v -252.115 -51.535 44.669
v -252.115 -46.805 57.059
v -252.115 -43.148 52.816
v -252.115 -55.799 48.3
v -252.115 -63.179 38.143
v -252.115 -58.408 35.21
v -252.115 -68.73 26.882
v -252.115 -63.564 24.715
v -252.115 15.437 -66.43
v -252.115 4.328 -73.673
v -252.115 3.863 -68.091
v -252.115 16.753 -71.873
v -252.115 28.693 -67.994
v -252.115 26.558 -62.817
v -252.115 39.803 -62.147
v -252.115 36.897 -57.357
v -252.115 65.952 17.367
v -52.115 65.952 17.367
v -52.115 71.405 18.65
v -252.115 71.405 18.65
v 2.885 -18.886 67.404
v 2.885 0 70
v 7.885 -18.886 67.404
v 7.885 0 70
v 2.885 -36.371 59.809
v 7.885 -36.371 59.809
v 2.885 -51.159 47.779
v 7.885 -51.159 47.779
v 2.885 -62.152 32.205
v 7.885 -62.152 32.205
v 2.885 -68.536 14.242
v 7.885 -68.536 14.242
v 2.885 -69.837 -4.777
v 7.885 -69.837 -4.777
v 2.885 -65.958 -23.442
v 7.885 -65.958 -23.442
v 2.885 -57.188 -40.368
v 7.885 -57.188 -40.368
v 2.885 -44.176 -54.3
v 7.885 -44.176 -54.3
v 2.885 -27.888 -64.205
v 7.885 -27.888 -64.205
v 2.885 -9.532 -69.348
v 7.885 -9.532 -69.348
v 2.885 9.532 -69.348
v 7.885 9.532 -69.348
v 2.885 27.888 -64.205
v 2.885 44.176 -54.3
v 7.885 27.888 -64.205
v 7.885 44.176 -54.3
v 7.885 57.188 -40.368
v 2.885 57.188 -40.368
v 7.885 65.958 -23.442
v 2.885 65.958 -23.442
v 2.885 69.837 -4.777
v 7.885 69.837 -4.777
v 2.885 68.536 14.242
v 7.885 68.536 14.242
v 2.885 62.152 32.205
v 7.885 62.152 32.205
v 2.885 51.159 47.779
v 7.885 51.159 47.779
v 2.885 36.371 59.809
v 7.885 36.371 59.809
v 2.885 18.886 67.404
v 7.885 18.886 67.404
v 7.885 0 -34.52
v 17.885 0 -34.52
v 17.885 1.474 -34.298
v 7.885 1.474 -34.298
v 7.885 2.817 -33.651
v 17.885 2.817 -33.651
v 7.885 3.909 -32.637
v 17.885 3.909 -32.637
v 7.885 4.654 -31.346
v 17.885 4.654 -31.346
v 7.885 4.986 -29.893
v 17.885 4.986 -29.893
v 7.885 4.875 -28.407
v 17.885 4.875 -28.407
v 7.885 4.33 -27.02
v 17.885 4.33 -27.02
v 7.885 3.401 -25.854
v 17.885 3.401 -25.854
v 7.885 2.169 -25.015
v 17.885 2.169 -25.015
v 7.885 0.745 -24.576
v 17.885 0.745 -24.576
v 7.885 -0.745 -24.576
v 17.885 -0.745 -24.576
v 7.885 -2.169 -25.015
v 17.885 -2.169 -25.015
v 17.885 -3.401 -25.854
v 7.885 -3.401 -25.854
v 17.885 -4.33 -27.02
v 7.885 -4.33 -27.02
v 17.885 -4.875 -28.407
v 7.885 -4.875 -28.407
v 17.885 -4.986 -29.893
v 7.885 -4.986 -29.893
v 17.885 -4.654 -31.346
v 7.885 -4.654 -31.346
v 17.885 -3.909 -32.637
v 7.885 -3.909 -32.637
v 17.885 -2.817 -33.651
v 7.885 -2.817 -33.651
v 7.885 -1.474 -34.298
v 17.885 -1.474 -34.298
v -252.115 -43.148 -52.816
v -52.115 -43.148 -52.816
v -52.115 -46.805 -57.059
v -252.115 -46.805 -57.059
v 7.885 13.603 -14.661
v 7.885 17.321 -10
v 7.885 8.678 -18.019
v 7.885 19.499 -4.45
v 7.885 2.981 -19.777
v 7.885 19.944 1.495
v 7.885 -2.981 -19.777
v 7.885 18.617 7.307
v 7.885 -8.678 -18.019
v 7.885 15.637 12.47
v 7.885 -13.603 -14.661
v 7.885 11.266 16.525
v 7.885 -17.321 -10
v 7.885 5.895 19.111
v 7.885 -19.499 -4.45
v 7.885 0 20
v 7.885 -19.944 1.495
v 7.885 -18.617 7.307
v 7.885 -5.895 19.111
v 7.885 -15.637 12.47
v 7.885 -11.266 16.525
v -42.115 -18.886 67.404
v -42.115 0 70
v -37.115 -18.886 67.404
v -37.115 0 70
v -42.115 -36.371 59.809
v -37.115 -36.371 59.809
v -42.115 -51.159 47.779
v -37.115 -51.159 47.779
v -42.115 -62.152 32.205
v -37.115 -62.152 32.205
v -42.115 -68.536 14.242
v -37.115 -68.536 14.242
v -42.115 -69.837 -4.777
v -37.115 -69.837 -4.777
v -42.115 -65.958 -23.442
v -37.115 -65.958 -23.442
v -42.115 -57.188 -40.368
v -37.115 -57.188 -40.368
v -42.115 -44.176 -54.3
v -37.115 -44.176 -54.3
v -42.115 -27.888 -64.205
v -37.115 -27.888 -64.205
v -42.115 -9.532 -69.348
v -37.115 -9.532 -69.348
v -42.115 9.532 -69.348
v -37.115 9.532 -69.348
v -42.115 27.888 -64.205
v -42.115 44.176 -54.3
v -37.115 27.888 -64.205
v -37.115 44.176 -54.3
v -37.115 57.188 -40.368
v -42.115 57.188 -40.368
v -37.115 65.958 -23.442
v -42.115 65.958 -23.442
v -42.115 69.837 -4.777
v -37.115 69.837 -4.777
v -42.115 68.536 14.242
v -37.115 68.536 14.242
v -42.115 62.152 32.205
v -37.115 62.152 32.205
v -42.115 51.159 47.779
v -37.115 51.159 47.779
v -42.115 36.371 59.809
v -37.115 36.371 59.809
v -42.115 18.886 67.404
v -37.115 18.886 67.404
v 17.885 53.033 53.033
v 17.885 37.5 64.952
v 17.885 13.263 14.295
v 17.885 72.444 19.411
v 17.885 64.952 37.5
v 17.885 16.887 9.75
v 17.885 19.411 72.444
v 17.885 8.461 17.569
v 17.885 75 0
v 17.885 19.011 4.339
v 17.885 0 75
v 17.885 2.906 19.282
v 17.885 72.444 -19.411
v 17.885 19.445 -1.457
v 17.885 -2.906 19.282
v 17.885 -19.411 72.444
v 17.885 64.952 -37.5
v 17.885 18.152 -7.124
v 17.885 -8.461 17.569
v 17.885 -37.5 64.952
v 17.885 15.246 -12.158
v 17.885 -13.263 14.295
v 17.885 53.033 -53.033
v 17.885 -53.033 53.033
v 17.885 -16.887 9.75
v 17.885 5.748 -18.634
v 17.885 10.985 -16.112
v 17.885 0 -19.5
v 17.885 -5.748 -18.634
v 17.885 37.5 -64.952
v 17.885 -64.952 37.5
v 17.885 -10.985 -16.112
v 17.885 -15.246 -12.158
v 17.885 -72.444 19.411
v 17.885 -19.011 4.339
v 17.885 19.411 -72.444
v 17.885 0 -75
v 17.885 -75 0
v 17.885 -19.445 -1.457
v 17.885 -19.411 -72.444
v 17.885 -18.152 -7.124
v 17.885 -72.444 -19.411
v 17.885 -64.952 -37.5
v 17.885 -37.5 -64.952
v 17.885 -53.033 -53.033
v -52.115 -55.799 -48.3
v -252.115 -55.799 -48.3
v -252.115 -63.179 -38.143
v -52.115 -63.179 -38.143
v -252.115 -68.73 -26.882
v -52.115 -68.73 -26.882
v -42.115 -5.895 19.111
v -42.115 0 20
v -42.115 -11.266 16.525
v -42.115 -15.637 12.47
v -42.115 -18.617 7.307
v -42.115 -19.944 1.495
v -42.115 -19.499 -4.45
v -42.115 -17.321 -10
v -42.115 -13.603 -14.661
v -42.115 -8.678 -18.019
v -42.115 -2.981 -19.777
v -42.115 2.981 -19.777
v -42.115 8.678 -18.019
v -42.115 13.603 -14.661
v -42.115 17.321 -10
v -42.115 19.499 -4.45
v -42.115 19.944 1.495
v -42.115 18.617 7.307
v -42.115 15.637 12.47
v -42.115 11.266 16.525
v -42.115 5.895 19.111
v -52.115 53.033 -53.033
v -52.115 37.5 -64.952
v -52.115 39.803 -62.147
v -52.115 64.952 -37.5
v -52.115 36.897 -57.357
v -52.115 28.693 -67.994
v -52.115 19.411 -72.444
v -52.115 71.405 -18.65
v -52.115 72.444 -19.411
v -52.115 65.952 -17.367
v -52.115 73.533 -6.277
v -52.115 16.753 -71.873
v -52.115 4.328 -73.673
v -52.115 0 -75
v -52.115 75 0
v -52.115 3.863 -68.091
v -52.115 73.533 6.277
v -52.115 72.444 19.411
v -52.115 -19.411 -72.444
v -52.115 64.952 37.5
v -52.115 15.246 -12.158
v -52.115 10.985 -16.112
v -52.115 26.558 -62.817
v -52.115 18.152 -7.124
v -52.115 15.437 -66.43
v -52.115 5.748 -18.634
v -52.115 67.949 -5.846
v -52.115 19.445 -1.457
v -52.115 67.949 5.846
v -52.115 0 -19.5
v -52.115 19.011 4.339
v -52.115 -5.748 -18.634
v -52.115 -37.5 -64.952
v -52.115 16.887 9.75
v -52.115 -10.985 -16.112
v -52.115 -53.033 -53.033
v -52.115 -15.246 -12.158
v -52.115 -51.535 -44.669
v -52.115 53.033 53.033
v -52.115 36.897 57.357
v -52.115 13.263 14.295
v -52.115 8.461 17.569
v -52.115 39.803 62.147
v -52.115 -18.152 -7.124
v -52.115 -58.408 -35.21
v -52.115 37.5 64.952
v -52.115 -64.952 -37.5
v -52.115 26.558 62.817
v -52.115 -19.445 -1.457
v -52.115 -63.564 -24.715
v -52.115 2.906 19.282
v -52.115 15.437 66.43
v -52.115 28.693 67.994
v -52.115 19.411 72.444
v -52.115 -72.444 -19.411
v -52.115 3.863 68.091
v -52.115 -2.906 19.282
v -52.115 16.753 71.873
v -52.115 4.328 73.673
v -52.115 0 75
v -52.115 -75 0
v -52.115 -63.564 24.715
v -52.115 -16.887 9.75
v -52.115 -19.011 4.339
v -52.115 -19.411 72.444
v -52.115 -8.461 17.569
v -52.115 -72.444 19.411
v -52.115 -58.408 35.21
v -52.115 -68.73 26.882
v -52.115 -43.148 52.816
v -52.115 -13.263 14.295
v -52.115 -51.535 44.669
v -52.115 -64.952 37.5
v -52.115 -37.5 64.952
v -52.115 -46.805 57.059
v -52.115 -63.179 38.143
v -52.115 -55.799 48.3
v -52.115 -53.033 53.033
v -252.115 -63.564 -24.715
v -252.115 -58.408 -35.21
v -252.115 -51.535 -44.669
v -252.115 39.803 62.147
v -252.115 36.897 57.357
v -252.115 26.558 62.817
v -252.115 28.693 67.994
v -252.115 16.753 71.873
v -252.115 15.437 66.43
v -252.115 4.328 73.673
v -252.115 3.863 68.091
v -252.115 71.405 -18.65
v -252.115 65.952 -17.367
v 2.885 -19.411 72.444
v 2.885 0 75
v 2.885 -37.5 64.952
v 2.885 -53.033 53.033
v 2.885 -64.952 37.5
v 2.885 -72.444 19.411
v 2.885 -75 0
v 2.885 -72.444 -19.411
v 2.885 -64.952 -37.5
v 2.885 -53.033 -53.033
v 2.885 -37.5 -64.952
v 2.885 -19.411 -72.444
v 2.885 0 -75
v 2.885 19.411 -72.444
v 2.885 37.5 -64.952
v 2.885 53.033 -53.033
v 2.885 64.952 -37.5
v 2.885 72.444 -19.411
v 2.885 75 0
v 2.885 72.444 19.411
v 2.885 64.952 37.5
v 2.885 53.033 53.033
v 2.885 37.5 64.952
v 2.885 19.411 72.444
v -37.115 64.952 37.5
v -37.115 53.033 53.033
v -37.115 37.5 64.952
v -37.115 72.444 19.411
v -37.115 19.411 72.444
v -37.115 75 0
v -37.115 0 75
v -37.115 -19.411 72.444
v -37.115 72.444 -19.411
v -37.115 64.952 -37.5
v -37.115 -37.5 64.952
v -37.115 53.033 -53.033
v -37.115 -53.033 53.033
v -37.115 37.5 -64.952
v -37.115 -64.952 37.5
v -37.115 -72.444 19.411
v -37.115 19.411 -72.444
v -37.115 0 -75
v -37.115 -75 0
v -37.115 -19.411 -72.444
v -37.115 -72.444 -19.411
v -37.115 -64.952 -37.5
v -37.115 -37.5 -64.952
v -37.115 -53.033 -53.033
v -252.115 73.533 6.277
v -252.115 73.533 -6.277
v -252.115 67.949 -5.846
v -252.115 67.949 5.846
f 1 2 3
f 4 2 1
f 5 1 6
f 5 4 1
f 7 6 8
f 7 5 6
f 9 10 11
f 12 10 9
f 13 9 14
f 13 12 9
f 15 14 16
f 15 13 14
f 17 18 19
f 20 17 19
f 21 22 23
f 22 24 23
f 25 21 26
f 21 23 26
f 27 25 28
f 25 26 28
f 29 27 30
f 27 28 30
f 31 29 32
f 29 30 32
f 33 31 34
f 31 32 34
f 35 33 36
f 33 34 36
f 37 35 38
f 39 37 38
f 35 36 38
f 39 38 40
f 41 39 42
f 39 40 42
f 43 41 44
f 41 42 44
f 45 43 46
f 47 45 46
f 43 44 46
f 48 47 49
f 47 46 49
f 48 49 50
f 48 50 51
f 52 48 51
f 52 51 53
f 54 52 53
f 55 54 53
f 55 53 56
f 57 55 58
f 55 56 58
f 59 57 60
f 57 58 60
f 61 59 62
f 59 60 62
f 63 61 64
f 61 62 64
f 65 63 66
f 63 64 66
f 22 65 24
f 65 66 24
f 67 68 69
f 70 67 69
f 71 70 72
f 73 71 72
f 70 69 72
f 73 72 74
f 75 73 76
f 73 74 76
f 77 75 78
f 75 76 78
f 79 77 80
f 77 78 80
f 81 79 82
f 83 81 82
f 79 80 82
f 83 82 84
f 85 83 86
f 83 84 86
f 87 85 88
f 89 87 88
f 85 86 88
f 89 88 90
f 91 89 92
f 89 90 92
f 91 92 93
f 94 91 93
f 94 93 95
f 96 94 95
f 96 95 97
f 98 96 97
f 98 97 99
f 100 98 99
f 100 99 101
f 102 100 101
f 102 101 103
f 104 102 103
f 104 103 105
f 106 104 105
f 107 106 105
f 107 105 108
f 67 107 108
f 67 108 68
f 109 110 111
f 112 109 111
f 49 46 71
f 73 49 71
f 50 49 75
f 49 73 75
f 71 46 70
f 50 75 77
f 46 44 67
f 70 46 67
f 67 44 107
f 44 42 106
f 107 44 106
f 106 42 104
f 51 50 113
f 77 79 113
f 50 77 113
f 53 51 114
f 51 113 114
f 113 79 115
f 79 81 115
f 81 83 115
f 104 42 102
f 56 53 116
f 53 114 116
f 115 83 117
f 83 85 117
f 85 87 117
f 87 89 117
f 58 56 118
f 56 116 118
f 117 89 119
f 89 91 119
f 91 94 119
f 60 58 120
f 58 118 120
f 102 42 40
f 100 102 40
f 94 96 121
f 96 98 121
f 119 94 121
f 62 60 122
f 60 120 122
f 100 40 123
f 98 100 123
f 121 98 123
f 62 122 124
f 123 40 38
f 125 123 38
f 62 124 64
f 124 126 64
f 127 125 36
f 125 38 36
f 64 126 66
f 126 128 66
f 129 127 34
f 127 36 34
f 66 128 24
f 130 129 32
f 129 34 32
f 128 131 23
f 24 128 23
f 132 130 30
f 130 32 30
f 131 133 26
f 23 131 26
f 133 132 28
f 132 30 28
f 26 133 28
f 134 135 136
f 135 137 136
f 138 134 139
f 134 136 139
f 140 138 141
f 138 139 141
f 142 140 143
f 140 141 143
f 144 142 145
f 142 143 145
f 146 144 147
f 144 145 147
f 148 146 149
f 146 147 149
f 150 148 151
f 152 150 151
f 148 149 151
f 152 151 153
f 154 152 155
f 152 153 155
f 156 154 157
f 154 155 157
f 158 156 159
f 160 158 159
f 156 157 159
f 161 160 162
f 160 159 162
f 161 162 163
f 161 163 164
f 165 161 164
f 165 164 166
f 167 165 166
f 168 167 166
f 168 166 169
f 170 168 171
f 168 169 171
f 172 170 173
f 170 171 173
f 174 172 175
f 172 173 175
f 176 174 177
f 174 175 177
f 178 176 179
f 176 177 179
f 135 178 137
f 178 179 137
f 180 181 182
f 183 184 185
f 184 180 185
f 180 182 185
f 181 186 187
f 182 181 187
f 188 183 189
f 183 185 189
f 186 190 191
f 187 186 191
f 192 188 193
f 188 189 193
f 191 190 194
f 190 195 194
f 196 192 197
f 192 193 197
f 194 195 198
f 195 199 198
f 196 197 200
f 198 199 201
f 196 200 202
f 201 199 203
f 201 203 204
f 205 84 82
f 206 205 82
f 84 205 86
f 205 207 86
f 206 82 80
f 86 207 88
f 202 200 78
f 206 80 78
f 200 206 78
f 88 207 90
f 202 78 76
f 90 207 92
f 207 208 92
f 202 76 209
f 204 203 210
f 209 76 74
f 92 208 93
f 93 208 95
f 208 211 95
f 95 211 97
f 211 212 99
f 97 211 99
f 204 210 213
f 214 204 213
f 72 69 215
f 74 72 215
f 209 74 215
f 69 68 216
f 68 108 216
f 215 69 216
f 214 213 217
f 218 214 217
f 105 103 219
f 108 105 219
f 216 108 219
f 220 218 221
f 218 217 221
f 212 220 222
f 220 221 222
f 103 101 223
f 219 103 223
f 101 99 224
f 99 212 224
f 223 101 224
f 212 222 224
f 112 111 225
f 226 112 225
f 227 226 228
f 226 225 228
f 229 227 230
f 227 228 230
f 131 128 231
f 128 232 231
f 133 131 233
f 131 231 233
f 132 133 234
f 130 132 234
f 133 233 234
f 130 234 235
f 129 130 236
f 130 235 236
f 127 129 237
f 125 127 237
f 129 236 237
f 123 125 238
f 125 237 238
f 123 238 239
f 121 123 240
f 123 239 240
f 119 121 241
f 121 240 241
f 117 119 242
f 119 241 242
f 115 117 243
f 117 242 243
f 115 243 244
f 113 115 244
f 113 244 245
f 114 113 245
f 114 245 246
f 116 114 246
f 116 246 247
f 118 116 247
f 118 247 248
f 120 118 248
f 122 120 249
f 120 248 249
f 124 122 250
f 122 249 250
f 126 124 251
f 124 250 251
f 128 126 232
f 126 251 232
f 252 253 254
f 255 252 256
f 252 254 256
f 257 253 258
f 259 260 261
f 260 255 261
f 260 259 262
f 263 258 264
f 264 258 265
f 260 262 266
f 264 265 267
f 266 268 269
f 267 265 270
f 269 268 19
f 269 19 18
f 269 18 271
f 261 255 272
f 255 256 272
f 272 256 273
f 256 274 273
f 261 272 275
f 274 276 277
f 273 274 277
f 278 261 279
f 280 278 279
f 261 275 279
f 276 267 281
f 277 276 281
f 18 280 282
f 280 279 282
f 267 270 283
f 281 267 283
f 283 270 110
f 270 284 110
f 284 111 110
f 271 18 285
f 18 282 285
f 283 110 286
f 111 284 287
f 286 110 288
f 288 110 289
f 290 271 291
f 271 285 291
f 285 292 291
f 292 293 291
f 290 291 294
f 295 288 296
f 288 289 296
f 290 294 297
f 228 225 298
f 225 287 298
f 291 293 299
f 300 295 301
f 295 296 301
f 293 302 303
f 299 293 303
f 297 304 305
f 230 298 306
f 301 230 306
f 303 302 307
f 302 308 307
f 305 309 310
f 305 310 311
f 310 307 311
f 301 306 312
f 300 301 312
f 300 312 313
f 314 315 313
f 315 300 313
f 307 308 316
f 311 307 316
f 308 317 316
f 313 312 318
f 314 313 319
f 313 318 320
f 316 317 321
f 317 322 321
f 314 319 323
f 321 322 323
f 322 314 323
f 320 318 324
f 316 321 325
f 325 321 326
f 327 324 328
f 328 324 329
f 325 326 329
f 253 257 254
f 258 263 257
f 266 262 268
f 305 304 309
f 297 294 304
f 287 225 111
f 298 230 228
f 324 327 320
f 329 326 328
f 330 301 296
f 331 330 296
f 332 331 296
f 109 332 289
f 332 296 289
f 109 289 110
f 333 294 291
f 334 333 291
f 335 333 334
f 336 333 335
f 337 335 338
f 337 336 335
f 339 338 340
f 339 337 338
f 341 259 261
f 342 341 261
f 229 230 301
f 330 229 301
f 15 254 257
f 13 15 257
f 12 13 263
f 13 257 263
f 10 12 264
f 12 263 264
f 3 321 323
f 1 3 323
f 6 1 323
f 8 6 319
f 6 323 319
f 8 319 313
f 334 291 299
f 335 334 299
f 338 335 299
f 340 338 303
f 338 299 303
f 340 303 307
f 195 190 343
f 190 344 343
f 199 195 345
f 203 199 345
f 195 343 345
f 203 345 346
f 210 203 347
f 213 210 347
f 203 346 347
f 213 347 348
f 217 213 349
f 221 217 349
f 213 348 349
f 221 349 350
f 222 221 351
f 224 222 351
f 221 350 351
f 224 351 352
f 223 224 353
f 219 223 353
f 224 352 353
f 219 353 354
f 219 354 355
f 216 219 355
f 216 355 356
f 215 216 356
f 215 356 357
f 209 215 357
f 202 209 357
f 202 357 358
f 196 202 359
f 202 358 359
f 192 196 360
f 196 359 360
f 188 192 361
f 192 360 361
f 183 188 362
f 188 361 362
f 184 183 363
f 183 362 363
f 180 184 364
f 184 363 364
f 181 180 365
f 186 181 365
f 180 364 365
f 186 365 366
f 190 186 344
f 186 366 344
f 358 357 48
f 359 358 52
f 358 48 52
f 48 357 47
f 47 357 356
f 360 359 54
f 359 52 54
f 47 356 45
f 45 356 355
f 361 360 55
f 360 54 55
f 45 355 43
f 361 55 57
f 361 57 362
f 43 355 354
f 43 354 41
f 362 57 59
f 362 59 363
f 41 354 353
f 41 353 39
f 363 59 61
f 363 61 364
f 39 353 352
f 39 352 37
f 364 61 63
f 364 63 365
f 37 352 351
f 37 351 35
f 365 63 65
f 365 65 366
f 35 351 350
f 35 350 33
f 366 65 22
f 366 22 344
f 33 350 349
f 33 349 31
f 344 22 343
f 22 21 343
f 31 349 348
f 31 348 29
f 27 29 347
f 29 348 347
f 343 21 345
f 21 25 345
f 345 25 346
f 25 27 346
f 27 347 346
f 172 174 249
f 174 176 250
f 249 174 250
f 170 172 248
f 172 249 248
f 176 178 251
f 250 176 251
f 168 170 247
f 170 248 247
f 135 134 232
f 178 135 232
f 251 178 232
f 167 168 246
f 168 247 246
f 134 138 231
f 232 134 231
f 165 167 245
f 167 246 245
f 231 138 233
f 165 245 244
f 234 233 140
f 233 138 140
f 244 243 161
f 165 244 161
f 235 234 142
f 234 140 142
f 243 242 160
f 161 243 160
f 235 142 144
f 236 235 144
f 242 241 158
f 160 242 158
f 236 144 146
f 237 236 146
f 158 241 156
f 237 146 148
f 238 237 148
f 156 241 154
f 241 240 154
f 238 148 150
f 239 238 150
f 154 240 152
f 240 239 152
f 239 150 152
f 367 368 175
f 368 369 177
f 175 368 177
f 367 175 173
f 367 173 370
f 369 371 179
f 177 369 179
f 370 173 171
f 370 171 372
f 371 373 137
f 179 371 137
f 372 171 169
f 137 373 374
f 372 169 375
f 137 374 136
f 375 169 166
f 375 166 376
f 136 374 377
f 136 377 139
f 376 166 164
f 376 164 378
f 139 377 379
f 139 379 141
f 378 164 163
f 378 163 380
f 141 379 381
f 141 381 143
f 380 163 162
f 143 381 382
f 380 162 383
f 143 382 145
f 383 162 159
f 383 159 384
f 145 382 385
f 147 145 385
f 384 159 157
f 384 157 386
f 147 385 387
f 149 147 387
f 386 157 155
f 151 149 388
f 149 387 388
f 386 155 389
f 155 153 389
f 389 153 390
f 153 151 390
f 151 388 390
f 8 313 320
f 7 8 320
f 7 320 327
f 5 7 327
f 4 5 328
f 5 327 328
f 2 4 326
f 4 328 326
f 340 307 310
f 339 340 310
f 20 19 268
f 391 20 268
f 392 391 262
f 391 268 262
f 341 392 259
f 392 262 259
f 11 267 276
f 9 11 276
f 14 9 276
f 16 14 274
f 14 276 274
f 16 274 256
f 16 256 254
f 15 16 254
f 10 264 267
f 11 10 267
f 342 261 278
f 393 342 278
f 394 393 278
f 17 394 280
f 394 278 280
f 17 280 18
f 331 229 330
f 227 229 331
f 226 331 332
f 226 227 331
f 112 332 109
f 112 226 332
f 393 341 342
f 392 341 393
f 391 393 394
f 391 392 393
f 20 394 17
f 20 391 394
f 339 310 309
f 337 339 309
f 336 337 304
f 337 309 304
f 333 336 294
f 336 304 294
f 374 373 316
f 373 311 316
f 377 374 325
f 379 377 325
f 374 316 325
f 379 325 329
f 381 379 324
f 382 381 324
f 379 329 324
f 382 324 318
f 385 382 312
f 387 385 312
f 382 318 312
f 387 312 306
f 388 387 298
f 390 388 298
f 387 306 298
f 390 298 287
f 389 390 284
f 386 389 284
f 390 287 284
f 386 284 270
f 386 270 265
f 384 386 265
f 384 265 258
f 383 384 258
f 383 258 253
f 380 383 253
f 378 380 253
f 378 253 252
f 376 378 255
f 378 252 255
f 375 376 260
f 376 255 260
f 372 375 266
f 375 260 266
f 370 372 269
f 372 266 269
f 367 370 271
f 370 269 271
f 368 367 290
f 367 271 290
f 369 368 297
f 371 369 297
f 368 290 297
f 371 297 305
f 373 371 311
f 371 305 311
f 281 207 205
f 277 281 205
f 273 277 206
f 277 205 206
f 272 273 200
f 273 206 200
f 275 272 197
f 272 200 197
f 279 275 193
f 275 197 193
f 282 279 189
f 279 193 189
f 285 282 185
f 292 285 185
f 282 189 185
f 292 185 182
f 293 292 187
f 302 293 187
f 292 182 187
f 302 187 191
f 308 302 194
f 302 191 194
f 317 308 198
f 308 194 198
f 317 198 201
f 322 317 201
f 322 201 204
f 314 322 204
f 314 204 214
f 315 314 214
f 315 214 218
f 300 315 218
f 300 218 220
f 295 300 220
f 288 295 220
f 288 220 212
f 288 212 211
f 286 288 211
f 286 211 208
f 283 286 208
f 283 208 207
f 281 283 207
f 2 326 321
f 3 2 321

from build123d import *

# Parameters (mm, degrees)
SKETCH4_R           = 5
CUT_EXTRUDE4_DEPTH  = 16
BOSS_EXTRUDE1_DEPTH = 200
CIRPATTERN1_COUNT   = 5
SKETCH6_R           = 19.5
CUT_EXTRUDE5_DEPTH  = 291.086194087


with BuildPart() as part:
    # Sketch1 → Revolve2 (revolve)
    with BuildSketch(Plane.XY, mode=Mode.PRIVATE) as revolve2_sk:
        Polygon((-52.115384615, 0), (17.884615385, 0), (17.884615385, 75), (2.884615385, 75), (2.884615385, 70), (7.884615385, 70), (7.884615385, 20), (-42.115384615, 20), (-42.115384615, 70), (-37.115384615, 70), (-37.115384615, 75), (-52.115384615, 75), align=None)
    revolve(revolve2_sk.sketch.rotate(Axis((-114.1965821, 0, 0), (1, 0, 0)), 90), axis=Axis((-114.1965821, 0, 0), (1, 0, 0)))

    # Sketch4 → Cut-Extrude4 (cut)
    with BuildSketch(Plane(origin=(17.884615385, 0, 0), x_dir=(0, 0, -1), z_dir=(1, 0, 0))):
        with Locations((29.519700861, 0)):
            Circle(SKETCH4_R)
    extrude(amount=-CUT_EXTRUDE4_DEPTH, mode=Mode.SUBTRACT)

    # Sketch2 → Boss-Extrude1 (add)
    with BuildSketch(Plane.ZY.offset(52.115384615)):
        with BuildLine():
            Line((-18.650225291, 71.40454535), (-17.367191992, 65.951653826))
            ThreePointArc((-17.367191992, 65.951653826), (0, 68.2), (17.367191992, 65.951653826))
            Line((17.367191992, 65.951653826), (18.650225291, 71.40454535))
            ThreePointArc((18.650225291, 71.40454535), (0, 73.8), (-18.650225291, 71.40454535))
        make_face()
    boss_extrude1 = extrude(amount=BOSS_EXTRUDE1_DEPTH)

    # CirPattern1: Boss-Extrude1 ×5 about axis
    cirpattern1_axis = Axis((0, 0, 0), (1, 0, 0))
    for i in range(1, CIRPATTERN1_COUNT):
        add(boss_extrude1.rotate(cirpattern1_axis, i * 360 / CIRPATTERN1_COUNT))

    # Sketch6 → Cut-Extrude5 (cut, through all)
    with BuildSketch(Plane(origin=(17.884615385, 0, 0), x_dir=(0, 0, -1), z_dir=(1, 0, 0))):
        Circle(SKETCH6_R)
    extrude(amount=-CUT_EXTRUDE5_DEPTH, mode=Mode.SUBTRACT)


solid = part.part
